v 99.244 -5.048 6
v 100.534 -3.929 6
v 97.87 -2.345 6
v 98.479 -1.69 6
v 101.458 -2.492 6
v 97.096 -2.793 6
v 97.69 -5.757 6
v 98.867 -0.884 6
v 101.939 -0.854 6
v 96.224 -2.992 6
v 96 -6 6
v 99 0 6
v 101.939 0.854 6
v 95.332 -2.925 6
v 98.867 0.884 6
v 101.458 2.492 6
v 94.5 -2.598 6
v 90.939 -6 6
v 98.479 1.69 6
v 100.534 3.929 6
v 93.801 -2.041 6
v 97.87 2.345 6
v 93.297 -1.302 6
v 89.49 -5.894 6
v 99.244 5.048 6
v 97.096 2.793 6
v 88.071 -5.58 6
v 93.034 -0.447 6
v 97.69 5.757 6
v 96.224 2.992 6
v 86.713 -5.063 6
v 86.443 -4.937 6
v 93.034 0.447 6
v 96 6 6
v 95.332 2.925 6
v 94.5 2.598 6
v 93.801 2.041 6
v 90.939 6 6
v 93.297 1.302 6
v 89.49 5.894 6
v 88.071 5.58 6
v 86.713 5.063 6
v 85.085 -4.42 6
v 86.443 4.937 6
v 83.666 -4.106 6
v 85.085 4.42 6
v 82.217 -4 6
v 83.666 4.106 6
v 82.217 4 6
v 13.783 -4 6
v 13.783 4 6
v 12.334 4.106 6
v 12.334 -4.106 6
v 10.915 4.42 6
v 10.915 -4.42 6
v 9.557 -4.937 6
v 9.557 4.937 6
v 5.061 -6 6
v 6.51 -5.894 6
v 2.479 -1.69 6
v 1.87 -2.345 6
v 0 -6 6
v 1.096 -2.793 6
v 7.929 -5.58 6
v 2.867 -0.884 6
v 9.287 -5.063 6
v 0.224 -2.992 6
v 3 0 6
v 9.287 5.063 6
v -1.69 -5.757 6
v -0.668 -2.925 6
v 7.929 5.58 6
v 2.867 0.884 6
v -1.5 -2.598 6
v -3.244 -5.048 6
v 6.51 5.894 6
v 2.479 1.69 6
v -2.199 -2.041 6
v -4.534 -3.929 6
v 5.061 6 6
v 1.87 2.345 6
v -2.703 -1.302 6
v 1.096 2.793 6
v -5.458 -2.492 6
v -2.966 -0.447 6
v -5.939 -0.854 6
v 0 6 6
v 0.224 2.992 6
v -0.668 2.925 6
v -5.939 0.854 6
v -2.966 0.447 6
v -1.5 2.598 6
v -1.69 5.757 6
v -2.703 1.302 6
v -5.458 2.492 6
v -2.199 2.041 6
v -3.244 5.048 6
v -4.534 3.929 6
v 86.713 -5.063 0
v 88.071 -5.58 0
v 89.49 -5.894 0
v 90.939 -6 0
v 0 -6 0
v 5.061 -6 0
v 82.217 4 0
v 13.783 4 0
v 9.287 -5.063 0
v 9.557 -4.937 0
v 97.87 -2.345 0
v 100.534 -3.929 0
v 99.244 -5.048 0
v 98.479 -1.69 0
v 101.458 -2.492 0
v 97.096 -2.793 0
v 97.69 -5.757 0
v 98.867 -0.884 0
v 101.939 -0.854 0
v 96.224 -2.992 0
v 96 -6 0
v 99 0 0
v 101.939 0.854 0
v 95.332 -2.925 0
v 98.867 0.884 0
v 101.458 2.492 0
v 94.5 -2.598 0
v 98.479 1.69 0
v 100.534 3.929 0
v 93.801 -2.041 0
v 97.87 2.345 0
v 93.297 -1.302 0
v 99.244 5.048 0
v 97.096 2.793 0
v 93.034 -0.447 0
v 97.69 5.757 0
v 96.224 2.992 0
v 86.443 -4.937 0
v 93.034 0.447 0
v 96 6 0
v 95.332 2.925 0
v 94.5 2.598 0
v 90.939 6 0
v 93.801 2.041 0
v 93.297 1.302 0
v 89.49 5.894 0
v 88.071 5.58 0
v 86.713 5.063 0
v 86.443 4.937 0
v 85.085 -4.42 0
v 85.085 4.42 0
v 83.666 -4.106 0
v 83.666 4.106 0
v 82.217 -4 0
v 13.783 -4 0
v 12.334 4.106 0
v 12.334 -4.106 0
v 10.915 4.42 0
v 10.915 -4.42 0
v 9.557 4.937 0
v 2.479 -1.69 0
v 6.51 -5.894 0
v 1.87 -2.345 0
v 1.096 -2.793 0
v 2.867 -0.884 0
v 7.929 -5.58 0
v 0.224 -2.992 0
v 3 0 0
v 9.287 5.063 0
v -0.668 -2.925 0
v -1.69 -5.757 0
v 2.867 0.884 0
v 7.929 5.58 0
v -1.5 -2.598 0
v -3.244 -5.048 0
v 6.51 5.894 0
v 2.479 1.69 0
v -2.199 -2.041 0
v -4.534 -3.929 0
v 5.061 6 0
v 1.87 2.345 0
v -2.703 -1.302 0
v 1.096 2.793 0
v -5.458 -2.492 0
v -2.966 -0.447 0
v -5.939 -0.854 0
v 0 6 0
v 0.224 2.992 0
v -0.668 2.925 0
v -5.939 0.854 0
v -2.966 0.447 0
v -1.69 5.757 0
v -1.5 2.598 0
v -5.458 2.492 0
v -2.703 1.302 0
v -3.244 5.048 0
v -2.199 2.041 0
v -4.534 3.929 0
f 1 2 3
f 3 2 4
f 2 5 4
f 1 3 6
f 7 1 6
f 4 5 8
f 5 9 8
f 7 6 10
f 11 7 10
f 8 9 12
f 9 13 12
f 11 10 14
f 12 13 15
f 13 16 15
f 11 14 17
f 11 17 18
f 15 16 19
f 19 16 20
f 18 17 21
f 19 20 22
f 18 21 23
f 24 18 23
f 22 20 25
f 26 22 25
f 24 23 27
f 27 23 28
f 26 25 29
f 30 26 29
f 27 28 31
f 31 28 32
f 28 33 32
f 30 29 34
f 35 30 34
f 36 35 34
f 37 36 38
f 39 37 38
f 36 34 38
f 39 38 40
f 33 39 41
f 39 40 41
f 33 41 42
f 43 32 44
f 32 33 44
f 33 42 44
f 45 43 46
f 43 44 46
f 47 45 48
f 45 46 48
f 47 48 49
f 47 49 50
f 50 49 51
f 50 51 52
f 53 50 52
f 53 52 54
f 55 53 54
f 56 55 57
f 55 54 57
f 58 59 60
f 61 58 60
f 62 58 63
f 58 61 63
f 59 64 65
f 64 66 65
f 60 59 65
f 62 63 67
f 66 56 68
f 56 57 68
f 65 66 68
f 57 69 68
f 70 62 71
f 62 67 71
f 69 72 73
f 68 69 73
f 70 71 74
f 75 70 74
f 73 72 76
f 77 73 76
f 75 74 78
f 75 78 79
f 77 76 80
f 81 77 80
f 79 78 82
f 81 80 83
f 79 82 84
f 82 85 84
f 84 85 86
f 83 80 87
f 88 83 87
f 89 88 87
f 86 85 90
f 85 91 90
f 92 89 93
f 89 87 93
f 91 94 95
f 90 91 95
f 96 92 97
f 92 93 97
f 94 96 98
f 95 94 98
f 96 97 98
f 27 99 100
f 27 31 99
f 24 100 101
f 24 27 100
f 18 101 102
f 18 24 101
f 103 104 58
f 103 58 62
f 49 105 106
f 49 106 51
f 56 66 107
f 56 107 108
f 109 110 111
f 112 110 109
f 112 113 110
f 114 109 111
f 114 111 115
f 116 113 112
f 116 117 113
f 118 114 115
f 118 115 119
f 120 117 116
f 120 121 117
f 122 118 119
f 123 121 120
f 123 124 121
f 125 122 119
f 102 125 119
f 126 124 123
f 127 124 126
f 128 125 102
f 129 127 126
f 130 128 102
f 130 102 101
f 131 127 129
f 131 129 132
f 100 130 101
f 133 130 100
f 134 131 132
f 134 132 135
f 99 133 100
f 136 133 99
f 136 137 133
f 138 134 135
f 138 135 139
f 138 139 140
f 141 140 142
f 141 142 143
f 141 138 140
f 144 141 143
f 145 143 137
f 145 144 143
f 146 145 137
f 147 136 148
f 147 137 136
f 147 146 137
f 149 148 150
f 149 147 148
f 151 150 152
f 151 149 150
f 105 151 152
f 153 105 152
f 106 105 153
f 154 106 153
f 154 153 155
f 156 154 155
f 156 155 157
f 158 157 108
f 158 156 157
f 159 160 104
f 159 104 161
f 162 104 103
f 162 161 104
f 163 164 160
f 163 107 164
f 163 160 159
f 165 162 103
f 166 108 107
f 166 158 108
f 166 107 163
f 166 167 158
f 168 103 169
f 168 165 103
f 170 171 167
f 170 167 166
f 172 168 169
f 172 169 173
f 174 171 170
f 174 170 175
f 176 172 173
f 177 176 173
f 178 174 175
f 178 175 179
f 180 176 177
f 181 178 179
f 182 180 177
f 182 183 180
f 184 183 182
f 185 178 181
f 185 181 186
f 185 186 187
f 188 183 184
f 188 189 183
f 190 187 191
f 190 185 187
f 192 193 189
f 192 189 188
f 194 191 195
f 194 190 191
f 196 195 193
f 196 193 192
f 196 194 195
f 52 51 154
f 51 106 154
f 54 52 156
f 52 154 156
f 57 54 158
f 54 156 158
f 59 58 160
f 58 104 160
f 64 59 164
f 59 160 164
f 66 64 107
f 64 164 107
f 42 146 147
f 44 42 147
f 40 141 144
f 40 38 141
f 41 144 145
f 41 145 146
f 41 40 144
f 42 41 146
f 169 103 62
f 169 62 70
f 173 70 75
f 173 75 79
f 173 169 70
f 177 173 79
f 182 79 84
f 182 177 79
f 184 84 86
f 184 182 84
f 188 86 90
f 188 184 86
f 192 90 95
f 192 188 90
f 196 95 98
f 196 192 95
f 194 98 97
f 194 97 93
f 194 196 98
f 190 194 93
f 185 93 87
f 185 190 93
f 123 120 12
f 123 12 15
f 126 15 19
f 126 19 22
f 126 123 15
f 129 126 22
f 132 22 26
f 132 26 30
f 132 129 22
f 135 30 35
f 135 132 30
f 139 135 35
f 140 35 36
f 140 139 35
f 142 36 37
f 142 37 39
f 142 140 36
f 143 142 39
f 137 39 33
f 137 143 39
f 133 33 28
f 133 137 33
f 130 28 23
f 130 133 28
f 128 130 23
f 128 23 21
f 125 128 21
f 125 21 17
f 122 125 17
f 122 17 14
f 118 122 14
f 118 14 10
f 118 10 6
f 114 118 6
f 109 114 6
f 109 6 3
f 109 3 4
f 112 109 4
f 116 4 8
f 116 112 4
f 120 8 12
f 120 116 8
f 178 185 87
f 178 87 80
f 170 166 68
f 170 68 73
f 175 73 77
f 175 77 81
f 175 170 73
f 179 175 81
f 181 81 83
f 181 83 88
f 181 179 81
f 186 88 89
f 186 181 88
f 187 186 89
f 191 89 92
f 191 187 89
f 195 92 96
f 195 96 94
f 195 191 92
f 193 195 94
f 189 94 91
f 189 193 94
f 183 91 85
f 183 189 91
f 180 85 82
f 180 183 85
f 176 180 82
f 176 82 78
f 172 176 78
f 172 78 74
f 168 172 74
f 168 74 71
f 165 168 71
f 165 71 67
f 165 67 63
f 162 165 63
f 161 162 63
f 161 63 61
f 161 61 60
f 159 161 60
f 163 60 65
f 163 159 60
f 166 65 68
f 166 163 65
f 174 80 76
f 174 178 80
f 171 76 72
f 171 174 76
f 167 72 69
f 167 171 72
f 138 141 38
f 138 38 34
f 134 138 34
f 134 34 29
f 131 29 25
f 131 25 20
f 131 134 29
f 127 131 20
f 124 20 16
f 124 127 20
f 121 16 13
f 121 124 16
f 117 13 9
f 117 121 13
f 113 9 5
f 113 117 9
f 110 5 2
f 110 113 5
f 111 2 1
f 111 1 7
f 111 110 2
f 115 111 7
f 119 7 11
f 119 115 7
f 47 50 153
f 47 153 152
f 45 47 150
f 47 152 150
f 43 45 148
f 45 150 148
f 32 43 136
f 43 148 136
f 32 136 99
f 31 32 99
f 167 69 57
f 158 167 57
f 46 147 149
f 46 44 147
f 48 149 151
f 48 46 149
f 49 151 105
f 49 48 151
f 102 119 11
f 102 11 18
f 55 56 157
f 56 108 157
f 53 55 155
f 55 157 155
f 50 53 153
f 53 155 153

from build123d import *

# Parameters (mm, degrees)
SKETCH1_R           = 3
BOSS_EXTRUDE2_DEPTH = 6
SKETCH2_W           = 60
SKETCH2_H           = 4
CUT_EXTRUDE2_DEPTH  = 103.352332655
CHAMFER2_SIZE       = 10.722534603
CHAMFER2_SIZE_2     = 5
FILLET2_R           = 10


with BuildPart() as part:
    # Sketch1 → Boss-Extrude2 (new body)
    with BuildSketch(Plane.XY):
        with BuildLine():
            Line((0, 6), (96, 6))
            ThreePointArc((96, 6), (102, 0), (96, -6))
            Line((96, -6), (0, -6))
            ThreePointArc((0, -6), (-6, 0), (0, 6))
        make_face()
        Circle(SKETCH1_R, mode=Mode.SUBTRACT)
        with Locations((96, 0)):
            Circle(SKETCH1_R, mode=Mode.SUBTRACT)
    extrude(amount=BOSS_EXTRUDE2_DEPTH)

    # Sketch2 → Cut-Extrude2 (cut, through all)
    with BuildSketch(Plane.XY.offset(6)):
        with Locations((48, -6)):
            Rectangle(SKETCH2_W, SKETCH2_H)
        with Locations((48, 6)):
            Rectangle(SKETCH2_W, SKETCH2_H)
    extrude(amount=-CUT_EXTRUDE2_DEPTH, mode=Mode.SUBTRACT)

    # Chamfer2
    # the kernel refuses this chamfer: 10.722534603, 5 mm, written as the material it takes off along each edge
    with BuildSketch(Plane(origin=(78, 6, -27.781824147), x_dir=(0.9998669641130703, 0.01631116413111023, 0), z_dir=(0, 0, 1))) as chamfer2_piece_1_section:
        Polygon((CHAMFER2_SIZE * 0.999866964071, -CHAMFER2_SIZE * 0.0163111641304), (-CHAMFER2_SIZE_2 * 0.0163111641311, -CHAMFER2_SIZE_2 * 0.999866964113), (0, 0), align=None)
    chamfer2_piece_1 = extrude(amount=61.563648293, mode=Mode.PRIVATE)
    chamfer2_piece_1 = split(chamfer2_piece_1, bisect_by=Plane(origin=(82.533411446, 4, 3), z_dir=(0, 1, 0)), keep=Keep.TOP, mode=Mode.PRIVATE)
    add(chamfer2_piece_1, mode=Mode.SUBTRACT)
    with BuildSketch(Plane(origin=(78, -6, -27.781824147), x_dir=(-0.07481330637060442, 0.997197557753677, 0), z_dir=(0, 0, 1))) as chamfer2_piece_2_section:
        Polygon((CHAMFER2_SIZE_2 * 0.997197557754, -CHAMFER2_SIZE_2 * 0.0748133063706), (-CHAMFER2_SIZE * 0.0748133063675, -CHAMFER2_SIZE * 0.997197557712), (0, 0), align=None)
    chamfer2_piece_2 = extrude(amount=61.563648293, mode=Mode.PRIVATE)
    chamfer2_piece_2 = split(chamfer2_piece_2, bisect_by=Plane(origin=(82.533411446, -4, 3), z_dir=(0, -1, 0)), keep=Keep.TOP, mode=Mode.PRIVATE)
    add(chamfer2_piece_2, mode=Mode.SUBTRACT)
    with BuildSketch(Plane(origin=(18, -6, 33.781824147), x_dir=(-0.9998669641130703, -0.0163111641311102, 0), z_dir=(0, 0, -1))) as chamfer2_piece_3_section:
        Polygon((CHAMFER2_SIZE * 0.999866964071, CHAMFER2_SIZE * 0.0163111641304), (-CHAMFER2_SIZE_2 * 0.0163111641311, CHAMFER2_SIZE_2 * 0.999866964113), (0, 0), align=None)
    chamfer2_piece_3 = extrude(amount=61.563648293, mode=Mode.PRIVATE)
    chamfer2_piece_3 = split(chamfer2_piece_3, bisect_by=Plane(origin=(13.466588554, -4, 3), z_dir=(0, -1, 0)), keep=Keep.TOP, mode=Mode.PRIVATE)
    add(chamfer2_piece_3, mode=Mode.SUBTRACT)
    with BuildSketch(Plane(origin=(18, 6, 33.781824147), x_dir=(-0.9998669641130703, 0.016311164131110195, 0), z_dir=(0, 0, -1))) as chamfer2_piece_4_section:
        Polygon((CHAMFER2_SIZE * 0.999866964071, -CHAMFER2_SIZE * 0.0163111641304), (-CHAMFER2_SIZE_2 * 0.0163111641311, -CHAMFER2_SIZE_2 * 0.999866964113), (0, 0), align=None)
    chamfer2_piece_4 = extrude(amount=61.563648293, mode=Mode.PRIVATE)
    chamfer2_piece_4 = split(chamfer2_piece_4, bisect_by=Plane(origin=(13.466588554, 4, 3), z_dir=(0, 1, 0)), keep=Keep.TOP, mode=Mode.PRIVATE)
    add(chamfer2_piece_4, mode=Mode.SUBTRACT)

    # Fillet2
    fillet2_edges = [part.edges().sort_by_distance(p)[0] for p in [
        (88.722534603, 6, 3),
        (88.722534603, -6, 3),
        (7.277465397, -6, 3),
        (7.277465397, 6, 3),
        (84.433520762, 4, 3),
        (84.433520762, -4, 3),
        (11.566479238, -4, 3),
        (11.566479238, 4, 3),
    ]]
    fillet(fillet2_edges, radius=FILLET2_R)


solid = part.part
